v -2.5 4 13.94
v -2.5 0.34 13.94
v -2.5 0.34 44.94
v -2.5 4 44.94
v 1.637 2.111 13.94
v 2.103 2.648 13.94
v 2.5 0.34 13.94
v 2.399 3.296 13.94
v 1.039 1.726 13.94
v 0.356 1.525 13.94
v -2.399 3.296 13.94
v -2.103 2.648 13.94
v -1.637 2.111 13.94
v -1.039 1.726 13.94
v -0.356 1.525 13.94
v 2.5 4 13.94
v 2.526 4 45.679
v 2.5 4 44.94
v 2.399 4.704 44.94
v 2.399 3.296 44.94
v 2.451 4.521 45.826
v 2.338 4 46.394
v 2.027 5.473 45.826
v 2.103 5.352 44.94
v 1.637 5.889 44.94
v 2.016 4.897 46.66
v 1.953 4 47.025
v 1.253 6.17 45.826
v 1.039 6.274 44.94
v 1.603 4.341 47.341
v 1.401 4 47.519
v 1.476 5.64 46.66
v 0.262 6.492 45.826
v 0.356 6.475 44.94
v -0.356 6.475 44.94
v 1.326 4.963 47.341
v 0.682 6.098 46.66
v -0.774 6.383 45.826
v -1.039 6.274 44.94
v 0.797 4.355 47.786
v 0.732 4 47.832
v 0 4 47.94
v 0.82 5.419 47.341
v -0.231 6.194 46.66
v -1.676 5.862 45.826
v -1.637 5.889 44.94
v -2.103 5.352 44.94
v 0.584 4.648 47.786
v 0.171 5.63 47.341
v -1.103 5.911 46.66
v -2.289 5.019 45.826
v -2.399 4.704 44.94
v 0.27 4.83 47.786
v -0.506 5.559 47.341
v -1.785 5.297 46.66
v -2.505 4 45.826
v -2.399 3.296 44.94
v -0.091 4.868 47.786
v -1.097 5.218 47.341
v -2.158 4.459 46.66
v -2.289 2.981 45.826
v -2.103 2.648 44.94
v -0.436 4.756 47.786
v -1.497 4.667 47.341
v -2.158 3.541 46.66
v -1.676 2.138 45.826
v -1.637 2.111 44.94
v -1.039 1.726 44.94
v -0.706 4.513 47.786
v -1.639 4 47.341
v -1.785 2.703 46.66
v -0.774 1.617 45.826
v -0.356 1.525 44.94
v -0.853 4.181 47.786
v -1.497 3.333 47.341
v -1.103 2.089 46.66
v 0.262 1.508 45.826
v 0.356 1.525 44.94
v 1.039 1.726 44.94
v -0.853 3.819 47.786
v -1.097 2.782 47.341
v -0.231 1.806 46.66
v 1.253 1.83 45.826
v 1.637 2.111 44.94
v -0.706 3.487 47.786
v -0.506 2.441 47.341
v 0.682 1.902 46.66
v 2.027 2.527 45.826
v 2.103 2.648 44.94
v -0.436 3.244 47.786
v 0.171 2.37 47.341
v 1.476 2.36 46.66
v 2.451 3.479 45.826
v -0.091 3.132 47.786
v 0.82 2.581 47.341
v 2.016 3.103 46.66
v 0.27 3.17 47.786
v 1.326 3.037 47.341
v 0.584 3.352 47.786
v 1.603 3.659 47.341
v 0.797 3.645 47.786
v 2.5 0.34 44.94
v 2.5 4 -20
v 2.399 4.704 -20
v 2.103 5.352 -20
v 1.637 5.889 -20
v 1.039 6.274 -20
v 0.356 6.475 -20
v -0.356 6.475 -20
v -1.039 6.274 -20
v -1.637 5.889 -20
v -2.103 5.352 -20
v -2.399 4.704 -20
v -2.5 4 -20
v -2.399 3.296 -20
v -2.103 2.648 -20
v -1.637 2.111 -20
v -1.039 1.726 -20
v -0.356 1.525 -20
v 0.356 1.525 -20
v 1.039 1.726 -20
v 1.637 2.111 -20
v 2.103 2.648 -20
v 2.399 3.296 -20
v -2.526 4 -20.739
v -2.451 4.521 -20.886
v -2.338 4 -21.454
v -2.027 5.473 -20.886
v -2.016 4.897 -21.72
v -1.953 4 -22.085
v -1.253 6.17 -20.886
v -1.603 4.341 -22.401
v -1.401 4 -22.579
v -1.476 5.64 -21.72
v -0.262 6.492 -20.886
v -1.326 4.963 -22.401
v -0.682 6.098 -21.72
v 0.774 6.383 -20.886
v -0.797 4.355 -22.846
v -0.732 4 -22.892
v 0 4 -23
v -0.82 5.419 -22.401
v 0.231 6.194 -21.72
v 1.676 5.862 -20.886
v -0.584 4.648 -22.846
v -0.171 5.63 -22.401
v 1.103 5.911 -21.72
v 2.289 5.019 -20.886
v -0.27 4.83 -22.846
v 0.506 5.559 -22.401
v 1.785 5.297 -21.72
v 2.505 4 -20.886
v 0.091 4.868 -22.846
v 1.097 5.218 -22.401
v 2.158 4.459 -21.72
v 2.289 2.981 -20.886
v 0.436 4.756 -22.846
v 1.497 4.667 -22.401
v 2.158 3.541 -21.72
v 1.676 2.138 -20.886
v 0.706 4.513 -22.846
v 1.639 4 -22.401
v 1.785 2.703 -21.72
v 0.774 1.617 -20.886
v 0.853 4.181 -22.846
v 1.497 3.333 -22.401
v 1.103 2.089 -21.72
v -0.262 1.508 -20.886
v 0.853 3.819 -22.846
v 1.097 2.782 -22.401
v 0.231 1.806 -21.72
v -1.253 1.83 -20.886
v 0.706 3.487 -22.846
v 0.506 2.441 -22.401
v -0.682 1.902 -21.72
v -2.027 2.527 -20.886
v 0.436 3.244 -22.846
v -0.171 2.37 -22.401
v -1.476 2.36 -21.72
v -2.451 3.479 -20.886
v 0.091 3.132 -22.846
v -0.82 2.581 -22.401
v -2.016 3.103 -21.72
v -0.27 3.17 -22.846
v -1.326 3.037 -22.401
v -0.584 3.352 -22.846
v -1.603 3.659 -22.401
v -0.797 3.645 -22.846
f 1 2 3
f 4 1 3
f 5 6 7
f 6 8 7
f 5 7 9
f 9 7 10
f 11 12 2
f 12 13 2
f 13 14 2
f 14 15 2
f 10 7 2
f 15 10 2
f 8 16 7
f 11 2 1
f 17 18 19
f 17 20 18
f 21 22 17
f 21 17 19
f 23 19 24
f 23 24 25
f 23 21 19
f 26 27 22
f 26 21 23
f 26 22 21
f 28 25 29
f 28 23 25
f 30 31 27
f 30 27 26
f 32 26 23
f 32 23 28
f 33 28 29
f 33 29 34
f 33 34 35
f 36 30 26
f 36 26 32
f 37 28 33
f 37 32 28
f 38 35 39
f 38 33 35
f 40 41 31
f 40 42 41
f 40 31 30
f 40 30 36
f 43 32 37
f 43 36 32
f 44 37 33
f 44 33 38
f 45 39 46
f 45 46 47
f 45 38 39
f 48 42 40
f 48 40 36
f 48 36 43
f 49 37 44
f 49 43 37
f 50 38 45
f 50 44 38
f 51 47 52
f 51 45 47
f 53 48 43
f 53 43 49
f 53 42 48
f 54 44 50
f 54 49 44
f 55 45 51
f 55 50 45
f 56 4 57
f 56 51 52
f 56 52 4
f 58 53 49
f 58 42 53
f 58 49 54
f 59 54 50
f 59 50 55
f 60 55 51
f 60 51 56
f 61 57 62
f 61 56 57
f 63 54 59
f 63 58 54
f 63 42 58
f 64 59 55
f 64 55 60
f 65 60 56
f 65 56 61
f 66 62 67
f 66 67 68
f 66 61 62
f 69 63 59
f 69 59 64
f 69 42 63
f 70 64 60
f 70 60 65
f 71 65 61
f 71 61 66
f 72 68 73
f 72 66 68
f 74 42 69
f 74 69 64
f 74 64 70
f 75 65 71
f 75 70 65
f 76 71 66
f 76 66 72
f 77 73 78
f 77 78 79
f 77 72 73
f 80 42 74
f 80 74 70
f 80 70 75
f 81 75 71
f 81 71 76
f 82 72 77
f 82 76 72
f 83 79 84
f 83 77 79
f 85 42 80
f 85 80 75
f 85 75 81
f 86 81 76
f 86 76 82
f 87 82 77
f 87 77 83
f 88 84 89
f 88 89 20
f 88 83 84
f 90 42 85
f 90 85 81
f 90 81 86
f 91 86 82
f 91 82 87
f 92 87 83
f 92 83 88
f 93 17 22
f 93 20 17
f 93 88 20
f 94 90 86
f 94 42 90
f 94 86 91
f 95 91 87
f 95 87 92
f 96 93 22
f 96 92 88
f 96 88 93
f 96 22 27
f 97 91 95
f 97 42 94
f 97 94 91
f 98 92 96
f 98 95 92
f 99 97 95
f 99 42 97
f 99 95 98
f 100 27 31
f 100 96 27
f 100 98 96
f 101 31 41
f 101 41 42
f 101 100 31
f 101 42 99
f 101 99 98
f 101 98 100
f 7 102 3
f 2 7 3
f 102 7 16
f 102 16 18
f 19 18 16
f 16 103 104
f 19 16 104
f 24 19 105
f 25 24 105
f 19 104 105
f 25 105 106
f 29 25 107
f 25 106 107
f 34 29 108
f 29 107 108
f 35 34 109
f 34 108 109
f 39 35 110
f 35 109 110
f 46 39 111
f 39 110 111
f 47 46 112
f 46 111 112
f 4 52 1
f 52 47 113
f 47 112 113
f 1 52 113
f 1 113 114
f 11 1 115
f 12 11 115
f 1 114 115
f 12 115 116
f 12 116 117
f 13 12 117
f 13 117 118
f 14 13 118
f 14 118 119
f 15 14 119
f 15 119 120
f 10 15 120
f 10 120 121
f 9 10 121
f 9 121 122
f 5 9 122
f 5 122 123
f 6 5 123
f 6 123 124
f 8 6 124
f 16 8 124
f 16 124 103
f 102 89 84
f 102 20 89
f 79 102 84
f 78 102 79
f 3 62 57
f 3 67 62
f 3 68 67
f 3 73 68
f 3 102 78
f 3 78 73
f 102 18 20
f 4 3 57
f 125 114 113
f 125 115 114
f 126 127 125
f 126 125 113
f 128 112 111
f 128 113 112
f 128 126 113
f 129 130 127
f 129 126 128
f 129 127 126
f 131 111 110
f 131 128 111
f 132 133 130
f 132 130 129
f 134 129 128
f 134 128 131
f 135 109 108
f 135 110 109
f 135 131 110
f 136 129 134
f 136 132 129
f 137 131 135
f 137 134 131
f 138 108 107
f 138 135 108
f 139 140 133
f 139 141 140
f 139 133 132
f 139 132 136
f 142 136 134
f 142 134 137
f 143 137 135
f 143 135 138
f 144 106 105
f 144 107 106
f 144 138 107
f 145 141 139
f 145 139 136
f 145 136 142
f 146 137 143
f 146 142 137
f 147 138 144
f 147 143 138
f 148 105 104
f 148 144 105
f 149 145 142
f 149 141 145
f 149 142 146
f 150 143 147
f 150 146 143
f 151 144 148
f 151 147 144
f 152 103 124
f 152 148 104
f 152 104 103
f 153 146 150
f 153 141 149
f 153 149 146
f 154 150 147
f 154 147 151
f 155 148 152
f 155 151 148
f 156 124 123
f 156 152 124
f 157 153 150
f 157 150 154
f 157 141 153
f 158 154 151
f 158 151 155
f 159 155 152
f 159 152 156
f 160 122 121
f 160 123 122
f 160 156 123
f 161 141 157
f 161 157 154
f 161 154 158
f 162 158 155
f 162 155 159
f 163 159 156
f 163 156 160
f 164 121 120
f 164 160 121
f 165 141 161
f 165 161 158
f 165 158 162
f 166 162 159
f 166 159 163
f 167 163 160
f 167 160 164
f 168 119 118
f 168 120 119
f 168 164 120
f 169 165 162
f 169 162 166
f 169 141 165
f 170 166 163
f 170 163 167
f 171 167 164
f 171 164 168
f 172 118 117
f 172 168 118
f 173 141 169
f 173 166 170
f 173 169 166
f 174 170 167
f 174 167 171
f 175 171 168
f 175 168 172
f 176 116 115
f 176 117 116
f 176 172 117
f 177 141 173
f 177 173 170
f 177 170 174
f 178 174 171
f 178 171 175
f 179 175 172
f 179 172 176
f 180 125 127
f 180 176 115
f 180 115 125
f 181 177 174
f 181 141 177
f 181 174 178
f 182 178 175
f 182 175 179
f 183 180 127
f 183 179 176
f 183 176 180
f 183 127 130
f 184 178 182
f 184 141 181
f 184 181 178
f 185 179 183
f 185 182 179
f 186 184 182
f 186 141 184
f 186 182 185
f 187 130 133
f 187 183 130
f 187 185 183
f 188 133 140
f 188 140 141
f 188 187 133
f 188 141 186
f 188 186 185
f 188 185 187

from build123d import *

# Parameters (mm, degrees)
EXTRUDE1_DEPTH      = 44.94
EXTRUDE1_DEPTH_BACK = 20
SKETCH1_R           = 2.5
DOME1_FACE_RADIUS   = 2.5
DOME1_HEIGHT        = 3
DOME2_FACE_RADIUS   = 2.5
DOME2_HEIGHT        = 3
EXTRUDE2_REACH      = 50.406
EXTRUDE2_END_RADIUS = 2.5
SKETCH2_W           = 5
SKETCH2_H           = 31


with BuildPart() as part:
    # Sketch1 → Extrude1 (new, two sides: drawn at the far end of the back side and taken through both)
    with BuildSketch(Plane.XY.offset(-EXTRUDE1_DEPTH_BACK)):
        with Locations((0, 4)):
            Circle(SKETCH1_R)
    extrude(amount=EXTRUDE1_DEPTH + EXTRUDE1_DEPTH_BACK)

    # Dome1: a dome of height H over a round flat face of radius A is a cap of a sphere of radius (A * A + H * H) / (2 * H)
    dome1_r = (DOME1_FACE_RADIUS * DOME1_FACE_RADIUS + DOME1_HEIGHT * DOME1_HEIGHT) / (2 * DOME1_HEIGHT)
    dome1_base = Plane((0, 4, 44.94), z_dir=(0, 0, 1))
    with Locations(dome1_base.offset(DOME1_HEIGHT - dome1_r)):
        dome1_ball = Sphere(dome1_r, mode=Mode.PRIVATE)
    add(split(dome1_ball, bisect_by=dome1_base, keep=Keep.TOP, mode=Mode.PRIVATE))

    # Dome2: a dome of height H over a round flat face of radius A is a cap of a sphere of radius (A * A + H * H) / (2 * H)
    dome2_r = (DOME2_FACE_RADIUS * DOME2_FACE_RADIUS + DOME2_HEIGHT * DOME2_HEIGHT) / (2 * DOME2_HEIGHT)
    dome2_base = Plane((0, 4, -20), z_dir=(0, 0, -1))
    with Locations(dome2_base.offset(DOME2_HEIGHT - dome2_r)):
        dome2_ball = Sphere(dome2_r, mode=Mode.PRIVATE)
    add(split(dome2_ball, bisect_by=dome2_base, keep=Keep.TOP, mode=Mode.PRIVATE))

    # Extrude2: up to this cylinder (the profile starts outside it)
    extrude2_end = Plane(origin=(0, 4, 29.44), z_dir=(0, 0, 1)) * Cylinder(EXTRUDE2_END_RADIUS, 106.812, mode=Mode.PRIVATE)
    # Sketch2 → Extrude2 (add, up to the surface)
    with BuildSketch(Plane(origin=(0, 0.34, 0), x_dir=(-1, 0, 0), z_dir=(0, 1, 0)), mode=Mode.PRIVATE) as extrude2_sk1:
        with Locations((0, 29.44)):
            Rectangle(SKETCH2_W, SKETCH2_H)
    extrude2_tool1 = extrude(extrude2_sk1.sketch, amount=EXTRUDE2_REACH, mode=Mode.PRIVATE) - extrude2_end
    add(extrude2_tool1.solids().sort_by_distance((0, 0.34, 29.44))[0])


solid = part.part
